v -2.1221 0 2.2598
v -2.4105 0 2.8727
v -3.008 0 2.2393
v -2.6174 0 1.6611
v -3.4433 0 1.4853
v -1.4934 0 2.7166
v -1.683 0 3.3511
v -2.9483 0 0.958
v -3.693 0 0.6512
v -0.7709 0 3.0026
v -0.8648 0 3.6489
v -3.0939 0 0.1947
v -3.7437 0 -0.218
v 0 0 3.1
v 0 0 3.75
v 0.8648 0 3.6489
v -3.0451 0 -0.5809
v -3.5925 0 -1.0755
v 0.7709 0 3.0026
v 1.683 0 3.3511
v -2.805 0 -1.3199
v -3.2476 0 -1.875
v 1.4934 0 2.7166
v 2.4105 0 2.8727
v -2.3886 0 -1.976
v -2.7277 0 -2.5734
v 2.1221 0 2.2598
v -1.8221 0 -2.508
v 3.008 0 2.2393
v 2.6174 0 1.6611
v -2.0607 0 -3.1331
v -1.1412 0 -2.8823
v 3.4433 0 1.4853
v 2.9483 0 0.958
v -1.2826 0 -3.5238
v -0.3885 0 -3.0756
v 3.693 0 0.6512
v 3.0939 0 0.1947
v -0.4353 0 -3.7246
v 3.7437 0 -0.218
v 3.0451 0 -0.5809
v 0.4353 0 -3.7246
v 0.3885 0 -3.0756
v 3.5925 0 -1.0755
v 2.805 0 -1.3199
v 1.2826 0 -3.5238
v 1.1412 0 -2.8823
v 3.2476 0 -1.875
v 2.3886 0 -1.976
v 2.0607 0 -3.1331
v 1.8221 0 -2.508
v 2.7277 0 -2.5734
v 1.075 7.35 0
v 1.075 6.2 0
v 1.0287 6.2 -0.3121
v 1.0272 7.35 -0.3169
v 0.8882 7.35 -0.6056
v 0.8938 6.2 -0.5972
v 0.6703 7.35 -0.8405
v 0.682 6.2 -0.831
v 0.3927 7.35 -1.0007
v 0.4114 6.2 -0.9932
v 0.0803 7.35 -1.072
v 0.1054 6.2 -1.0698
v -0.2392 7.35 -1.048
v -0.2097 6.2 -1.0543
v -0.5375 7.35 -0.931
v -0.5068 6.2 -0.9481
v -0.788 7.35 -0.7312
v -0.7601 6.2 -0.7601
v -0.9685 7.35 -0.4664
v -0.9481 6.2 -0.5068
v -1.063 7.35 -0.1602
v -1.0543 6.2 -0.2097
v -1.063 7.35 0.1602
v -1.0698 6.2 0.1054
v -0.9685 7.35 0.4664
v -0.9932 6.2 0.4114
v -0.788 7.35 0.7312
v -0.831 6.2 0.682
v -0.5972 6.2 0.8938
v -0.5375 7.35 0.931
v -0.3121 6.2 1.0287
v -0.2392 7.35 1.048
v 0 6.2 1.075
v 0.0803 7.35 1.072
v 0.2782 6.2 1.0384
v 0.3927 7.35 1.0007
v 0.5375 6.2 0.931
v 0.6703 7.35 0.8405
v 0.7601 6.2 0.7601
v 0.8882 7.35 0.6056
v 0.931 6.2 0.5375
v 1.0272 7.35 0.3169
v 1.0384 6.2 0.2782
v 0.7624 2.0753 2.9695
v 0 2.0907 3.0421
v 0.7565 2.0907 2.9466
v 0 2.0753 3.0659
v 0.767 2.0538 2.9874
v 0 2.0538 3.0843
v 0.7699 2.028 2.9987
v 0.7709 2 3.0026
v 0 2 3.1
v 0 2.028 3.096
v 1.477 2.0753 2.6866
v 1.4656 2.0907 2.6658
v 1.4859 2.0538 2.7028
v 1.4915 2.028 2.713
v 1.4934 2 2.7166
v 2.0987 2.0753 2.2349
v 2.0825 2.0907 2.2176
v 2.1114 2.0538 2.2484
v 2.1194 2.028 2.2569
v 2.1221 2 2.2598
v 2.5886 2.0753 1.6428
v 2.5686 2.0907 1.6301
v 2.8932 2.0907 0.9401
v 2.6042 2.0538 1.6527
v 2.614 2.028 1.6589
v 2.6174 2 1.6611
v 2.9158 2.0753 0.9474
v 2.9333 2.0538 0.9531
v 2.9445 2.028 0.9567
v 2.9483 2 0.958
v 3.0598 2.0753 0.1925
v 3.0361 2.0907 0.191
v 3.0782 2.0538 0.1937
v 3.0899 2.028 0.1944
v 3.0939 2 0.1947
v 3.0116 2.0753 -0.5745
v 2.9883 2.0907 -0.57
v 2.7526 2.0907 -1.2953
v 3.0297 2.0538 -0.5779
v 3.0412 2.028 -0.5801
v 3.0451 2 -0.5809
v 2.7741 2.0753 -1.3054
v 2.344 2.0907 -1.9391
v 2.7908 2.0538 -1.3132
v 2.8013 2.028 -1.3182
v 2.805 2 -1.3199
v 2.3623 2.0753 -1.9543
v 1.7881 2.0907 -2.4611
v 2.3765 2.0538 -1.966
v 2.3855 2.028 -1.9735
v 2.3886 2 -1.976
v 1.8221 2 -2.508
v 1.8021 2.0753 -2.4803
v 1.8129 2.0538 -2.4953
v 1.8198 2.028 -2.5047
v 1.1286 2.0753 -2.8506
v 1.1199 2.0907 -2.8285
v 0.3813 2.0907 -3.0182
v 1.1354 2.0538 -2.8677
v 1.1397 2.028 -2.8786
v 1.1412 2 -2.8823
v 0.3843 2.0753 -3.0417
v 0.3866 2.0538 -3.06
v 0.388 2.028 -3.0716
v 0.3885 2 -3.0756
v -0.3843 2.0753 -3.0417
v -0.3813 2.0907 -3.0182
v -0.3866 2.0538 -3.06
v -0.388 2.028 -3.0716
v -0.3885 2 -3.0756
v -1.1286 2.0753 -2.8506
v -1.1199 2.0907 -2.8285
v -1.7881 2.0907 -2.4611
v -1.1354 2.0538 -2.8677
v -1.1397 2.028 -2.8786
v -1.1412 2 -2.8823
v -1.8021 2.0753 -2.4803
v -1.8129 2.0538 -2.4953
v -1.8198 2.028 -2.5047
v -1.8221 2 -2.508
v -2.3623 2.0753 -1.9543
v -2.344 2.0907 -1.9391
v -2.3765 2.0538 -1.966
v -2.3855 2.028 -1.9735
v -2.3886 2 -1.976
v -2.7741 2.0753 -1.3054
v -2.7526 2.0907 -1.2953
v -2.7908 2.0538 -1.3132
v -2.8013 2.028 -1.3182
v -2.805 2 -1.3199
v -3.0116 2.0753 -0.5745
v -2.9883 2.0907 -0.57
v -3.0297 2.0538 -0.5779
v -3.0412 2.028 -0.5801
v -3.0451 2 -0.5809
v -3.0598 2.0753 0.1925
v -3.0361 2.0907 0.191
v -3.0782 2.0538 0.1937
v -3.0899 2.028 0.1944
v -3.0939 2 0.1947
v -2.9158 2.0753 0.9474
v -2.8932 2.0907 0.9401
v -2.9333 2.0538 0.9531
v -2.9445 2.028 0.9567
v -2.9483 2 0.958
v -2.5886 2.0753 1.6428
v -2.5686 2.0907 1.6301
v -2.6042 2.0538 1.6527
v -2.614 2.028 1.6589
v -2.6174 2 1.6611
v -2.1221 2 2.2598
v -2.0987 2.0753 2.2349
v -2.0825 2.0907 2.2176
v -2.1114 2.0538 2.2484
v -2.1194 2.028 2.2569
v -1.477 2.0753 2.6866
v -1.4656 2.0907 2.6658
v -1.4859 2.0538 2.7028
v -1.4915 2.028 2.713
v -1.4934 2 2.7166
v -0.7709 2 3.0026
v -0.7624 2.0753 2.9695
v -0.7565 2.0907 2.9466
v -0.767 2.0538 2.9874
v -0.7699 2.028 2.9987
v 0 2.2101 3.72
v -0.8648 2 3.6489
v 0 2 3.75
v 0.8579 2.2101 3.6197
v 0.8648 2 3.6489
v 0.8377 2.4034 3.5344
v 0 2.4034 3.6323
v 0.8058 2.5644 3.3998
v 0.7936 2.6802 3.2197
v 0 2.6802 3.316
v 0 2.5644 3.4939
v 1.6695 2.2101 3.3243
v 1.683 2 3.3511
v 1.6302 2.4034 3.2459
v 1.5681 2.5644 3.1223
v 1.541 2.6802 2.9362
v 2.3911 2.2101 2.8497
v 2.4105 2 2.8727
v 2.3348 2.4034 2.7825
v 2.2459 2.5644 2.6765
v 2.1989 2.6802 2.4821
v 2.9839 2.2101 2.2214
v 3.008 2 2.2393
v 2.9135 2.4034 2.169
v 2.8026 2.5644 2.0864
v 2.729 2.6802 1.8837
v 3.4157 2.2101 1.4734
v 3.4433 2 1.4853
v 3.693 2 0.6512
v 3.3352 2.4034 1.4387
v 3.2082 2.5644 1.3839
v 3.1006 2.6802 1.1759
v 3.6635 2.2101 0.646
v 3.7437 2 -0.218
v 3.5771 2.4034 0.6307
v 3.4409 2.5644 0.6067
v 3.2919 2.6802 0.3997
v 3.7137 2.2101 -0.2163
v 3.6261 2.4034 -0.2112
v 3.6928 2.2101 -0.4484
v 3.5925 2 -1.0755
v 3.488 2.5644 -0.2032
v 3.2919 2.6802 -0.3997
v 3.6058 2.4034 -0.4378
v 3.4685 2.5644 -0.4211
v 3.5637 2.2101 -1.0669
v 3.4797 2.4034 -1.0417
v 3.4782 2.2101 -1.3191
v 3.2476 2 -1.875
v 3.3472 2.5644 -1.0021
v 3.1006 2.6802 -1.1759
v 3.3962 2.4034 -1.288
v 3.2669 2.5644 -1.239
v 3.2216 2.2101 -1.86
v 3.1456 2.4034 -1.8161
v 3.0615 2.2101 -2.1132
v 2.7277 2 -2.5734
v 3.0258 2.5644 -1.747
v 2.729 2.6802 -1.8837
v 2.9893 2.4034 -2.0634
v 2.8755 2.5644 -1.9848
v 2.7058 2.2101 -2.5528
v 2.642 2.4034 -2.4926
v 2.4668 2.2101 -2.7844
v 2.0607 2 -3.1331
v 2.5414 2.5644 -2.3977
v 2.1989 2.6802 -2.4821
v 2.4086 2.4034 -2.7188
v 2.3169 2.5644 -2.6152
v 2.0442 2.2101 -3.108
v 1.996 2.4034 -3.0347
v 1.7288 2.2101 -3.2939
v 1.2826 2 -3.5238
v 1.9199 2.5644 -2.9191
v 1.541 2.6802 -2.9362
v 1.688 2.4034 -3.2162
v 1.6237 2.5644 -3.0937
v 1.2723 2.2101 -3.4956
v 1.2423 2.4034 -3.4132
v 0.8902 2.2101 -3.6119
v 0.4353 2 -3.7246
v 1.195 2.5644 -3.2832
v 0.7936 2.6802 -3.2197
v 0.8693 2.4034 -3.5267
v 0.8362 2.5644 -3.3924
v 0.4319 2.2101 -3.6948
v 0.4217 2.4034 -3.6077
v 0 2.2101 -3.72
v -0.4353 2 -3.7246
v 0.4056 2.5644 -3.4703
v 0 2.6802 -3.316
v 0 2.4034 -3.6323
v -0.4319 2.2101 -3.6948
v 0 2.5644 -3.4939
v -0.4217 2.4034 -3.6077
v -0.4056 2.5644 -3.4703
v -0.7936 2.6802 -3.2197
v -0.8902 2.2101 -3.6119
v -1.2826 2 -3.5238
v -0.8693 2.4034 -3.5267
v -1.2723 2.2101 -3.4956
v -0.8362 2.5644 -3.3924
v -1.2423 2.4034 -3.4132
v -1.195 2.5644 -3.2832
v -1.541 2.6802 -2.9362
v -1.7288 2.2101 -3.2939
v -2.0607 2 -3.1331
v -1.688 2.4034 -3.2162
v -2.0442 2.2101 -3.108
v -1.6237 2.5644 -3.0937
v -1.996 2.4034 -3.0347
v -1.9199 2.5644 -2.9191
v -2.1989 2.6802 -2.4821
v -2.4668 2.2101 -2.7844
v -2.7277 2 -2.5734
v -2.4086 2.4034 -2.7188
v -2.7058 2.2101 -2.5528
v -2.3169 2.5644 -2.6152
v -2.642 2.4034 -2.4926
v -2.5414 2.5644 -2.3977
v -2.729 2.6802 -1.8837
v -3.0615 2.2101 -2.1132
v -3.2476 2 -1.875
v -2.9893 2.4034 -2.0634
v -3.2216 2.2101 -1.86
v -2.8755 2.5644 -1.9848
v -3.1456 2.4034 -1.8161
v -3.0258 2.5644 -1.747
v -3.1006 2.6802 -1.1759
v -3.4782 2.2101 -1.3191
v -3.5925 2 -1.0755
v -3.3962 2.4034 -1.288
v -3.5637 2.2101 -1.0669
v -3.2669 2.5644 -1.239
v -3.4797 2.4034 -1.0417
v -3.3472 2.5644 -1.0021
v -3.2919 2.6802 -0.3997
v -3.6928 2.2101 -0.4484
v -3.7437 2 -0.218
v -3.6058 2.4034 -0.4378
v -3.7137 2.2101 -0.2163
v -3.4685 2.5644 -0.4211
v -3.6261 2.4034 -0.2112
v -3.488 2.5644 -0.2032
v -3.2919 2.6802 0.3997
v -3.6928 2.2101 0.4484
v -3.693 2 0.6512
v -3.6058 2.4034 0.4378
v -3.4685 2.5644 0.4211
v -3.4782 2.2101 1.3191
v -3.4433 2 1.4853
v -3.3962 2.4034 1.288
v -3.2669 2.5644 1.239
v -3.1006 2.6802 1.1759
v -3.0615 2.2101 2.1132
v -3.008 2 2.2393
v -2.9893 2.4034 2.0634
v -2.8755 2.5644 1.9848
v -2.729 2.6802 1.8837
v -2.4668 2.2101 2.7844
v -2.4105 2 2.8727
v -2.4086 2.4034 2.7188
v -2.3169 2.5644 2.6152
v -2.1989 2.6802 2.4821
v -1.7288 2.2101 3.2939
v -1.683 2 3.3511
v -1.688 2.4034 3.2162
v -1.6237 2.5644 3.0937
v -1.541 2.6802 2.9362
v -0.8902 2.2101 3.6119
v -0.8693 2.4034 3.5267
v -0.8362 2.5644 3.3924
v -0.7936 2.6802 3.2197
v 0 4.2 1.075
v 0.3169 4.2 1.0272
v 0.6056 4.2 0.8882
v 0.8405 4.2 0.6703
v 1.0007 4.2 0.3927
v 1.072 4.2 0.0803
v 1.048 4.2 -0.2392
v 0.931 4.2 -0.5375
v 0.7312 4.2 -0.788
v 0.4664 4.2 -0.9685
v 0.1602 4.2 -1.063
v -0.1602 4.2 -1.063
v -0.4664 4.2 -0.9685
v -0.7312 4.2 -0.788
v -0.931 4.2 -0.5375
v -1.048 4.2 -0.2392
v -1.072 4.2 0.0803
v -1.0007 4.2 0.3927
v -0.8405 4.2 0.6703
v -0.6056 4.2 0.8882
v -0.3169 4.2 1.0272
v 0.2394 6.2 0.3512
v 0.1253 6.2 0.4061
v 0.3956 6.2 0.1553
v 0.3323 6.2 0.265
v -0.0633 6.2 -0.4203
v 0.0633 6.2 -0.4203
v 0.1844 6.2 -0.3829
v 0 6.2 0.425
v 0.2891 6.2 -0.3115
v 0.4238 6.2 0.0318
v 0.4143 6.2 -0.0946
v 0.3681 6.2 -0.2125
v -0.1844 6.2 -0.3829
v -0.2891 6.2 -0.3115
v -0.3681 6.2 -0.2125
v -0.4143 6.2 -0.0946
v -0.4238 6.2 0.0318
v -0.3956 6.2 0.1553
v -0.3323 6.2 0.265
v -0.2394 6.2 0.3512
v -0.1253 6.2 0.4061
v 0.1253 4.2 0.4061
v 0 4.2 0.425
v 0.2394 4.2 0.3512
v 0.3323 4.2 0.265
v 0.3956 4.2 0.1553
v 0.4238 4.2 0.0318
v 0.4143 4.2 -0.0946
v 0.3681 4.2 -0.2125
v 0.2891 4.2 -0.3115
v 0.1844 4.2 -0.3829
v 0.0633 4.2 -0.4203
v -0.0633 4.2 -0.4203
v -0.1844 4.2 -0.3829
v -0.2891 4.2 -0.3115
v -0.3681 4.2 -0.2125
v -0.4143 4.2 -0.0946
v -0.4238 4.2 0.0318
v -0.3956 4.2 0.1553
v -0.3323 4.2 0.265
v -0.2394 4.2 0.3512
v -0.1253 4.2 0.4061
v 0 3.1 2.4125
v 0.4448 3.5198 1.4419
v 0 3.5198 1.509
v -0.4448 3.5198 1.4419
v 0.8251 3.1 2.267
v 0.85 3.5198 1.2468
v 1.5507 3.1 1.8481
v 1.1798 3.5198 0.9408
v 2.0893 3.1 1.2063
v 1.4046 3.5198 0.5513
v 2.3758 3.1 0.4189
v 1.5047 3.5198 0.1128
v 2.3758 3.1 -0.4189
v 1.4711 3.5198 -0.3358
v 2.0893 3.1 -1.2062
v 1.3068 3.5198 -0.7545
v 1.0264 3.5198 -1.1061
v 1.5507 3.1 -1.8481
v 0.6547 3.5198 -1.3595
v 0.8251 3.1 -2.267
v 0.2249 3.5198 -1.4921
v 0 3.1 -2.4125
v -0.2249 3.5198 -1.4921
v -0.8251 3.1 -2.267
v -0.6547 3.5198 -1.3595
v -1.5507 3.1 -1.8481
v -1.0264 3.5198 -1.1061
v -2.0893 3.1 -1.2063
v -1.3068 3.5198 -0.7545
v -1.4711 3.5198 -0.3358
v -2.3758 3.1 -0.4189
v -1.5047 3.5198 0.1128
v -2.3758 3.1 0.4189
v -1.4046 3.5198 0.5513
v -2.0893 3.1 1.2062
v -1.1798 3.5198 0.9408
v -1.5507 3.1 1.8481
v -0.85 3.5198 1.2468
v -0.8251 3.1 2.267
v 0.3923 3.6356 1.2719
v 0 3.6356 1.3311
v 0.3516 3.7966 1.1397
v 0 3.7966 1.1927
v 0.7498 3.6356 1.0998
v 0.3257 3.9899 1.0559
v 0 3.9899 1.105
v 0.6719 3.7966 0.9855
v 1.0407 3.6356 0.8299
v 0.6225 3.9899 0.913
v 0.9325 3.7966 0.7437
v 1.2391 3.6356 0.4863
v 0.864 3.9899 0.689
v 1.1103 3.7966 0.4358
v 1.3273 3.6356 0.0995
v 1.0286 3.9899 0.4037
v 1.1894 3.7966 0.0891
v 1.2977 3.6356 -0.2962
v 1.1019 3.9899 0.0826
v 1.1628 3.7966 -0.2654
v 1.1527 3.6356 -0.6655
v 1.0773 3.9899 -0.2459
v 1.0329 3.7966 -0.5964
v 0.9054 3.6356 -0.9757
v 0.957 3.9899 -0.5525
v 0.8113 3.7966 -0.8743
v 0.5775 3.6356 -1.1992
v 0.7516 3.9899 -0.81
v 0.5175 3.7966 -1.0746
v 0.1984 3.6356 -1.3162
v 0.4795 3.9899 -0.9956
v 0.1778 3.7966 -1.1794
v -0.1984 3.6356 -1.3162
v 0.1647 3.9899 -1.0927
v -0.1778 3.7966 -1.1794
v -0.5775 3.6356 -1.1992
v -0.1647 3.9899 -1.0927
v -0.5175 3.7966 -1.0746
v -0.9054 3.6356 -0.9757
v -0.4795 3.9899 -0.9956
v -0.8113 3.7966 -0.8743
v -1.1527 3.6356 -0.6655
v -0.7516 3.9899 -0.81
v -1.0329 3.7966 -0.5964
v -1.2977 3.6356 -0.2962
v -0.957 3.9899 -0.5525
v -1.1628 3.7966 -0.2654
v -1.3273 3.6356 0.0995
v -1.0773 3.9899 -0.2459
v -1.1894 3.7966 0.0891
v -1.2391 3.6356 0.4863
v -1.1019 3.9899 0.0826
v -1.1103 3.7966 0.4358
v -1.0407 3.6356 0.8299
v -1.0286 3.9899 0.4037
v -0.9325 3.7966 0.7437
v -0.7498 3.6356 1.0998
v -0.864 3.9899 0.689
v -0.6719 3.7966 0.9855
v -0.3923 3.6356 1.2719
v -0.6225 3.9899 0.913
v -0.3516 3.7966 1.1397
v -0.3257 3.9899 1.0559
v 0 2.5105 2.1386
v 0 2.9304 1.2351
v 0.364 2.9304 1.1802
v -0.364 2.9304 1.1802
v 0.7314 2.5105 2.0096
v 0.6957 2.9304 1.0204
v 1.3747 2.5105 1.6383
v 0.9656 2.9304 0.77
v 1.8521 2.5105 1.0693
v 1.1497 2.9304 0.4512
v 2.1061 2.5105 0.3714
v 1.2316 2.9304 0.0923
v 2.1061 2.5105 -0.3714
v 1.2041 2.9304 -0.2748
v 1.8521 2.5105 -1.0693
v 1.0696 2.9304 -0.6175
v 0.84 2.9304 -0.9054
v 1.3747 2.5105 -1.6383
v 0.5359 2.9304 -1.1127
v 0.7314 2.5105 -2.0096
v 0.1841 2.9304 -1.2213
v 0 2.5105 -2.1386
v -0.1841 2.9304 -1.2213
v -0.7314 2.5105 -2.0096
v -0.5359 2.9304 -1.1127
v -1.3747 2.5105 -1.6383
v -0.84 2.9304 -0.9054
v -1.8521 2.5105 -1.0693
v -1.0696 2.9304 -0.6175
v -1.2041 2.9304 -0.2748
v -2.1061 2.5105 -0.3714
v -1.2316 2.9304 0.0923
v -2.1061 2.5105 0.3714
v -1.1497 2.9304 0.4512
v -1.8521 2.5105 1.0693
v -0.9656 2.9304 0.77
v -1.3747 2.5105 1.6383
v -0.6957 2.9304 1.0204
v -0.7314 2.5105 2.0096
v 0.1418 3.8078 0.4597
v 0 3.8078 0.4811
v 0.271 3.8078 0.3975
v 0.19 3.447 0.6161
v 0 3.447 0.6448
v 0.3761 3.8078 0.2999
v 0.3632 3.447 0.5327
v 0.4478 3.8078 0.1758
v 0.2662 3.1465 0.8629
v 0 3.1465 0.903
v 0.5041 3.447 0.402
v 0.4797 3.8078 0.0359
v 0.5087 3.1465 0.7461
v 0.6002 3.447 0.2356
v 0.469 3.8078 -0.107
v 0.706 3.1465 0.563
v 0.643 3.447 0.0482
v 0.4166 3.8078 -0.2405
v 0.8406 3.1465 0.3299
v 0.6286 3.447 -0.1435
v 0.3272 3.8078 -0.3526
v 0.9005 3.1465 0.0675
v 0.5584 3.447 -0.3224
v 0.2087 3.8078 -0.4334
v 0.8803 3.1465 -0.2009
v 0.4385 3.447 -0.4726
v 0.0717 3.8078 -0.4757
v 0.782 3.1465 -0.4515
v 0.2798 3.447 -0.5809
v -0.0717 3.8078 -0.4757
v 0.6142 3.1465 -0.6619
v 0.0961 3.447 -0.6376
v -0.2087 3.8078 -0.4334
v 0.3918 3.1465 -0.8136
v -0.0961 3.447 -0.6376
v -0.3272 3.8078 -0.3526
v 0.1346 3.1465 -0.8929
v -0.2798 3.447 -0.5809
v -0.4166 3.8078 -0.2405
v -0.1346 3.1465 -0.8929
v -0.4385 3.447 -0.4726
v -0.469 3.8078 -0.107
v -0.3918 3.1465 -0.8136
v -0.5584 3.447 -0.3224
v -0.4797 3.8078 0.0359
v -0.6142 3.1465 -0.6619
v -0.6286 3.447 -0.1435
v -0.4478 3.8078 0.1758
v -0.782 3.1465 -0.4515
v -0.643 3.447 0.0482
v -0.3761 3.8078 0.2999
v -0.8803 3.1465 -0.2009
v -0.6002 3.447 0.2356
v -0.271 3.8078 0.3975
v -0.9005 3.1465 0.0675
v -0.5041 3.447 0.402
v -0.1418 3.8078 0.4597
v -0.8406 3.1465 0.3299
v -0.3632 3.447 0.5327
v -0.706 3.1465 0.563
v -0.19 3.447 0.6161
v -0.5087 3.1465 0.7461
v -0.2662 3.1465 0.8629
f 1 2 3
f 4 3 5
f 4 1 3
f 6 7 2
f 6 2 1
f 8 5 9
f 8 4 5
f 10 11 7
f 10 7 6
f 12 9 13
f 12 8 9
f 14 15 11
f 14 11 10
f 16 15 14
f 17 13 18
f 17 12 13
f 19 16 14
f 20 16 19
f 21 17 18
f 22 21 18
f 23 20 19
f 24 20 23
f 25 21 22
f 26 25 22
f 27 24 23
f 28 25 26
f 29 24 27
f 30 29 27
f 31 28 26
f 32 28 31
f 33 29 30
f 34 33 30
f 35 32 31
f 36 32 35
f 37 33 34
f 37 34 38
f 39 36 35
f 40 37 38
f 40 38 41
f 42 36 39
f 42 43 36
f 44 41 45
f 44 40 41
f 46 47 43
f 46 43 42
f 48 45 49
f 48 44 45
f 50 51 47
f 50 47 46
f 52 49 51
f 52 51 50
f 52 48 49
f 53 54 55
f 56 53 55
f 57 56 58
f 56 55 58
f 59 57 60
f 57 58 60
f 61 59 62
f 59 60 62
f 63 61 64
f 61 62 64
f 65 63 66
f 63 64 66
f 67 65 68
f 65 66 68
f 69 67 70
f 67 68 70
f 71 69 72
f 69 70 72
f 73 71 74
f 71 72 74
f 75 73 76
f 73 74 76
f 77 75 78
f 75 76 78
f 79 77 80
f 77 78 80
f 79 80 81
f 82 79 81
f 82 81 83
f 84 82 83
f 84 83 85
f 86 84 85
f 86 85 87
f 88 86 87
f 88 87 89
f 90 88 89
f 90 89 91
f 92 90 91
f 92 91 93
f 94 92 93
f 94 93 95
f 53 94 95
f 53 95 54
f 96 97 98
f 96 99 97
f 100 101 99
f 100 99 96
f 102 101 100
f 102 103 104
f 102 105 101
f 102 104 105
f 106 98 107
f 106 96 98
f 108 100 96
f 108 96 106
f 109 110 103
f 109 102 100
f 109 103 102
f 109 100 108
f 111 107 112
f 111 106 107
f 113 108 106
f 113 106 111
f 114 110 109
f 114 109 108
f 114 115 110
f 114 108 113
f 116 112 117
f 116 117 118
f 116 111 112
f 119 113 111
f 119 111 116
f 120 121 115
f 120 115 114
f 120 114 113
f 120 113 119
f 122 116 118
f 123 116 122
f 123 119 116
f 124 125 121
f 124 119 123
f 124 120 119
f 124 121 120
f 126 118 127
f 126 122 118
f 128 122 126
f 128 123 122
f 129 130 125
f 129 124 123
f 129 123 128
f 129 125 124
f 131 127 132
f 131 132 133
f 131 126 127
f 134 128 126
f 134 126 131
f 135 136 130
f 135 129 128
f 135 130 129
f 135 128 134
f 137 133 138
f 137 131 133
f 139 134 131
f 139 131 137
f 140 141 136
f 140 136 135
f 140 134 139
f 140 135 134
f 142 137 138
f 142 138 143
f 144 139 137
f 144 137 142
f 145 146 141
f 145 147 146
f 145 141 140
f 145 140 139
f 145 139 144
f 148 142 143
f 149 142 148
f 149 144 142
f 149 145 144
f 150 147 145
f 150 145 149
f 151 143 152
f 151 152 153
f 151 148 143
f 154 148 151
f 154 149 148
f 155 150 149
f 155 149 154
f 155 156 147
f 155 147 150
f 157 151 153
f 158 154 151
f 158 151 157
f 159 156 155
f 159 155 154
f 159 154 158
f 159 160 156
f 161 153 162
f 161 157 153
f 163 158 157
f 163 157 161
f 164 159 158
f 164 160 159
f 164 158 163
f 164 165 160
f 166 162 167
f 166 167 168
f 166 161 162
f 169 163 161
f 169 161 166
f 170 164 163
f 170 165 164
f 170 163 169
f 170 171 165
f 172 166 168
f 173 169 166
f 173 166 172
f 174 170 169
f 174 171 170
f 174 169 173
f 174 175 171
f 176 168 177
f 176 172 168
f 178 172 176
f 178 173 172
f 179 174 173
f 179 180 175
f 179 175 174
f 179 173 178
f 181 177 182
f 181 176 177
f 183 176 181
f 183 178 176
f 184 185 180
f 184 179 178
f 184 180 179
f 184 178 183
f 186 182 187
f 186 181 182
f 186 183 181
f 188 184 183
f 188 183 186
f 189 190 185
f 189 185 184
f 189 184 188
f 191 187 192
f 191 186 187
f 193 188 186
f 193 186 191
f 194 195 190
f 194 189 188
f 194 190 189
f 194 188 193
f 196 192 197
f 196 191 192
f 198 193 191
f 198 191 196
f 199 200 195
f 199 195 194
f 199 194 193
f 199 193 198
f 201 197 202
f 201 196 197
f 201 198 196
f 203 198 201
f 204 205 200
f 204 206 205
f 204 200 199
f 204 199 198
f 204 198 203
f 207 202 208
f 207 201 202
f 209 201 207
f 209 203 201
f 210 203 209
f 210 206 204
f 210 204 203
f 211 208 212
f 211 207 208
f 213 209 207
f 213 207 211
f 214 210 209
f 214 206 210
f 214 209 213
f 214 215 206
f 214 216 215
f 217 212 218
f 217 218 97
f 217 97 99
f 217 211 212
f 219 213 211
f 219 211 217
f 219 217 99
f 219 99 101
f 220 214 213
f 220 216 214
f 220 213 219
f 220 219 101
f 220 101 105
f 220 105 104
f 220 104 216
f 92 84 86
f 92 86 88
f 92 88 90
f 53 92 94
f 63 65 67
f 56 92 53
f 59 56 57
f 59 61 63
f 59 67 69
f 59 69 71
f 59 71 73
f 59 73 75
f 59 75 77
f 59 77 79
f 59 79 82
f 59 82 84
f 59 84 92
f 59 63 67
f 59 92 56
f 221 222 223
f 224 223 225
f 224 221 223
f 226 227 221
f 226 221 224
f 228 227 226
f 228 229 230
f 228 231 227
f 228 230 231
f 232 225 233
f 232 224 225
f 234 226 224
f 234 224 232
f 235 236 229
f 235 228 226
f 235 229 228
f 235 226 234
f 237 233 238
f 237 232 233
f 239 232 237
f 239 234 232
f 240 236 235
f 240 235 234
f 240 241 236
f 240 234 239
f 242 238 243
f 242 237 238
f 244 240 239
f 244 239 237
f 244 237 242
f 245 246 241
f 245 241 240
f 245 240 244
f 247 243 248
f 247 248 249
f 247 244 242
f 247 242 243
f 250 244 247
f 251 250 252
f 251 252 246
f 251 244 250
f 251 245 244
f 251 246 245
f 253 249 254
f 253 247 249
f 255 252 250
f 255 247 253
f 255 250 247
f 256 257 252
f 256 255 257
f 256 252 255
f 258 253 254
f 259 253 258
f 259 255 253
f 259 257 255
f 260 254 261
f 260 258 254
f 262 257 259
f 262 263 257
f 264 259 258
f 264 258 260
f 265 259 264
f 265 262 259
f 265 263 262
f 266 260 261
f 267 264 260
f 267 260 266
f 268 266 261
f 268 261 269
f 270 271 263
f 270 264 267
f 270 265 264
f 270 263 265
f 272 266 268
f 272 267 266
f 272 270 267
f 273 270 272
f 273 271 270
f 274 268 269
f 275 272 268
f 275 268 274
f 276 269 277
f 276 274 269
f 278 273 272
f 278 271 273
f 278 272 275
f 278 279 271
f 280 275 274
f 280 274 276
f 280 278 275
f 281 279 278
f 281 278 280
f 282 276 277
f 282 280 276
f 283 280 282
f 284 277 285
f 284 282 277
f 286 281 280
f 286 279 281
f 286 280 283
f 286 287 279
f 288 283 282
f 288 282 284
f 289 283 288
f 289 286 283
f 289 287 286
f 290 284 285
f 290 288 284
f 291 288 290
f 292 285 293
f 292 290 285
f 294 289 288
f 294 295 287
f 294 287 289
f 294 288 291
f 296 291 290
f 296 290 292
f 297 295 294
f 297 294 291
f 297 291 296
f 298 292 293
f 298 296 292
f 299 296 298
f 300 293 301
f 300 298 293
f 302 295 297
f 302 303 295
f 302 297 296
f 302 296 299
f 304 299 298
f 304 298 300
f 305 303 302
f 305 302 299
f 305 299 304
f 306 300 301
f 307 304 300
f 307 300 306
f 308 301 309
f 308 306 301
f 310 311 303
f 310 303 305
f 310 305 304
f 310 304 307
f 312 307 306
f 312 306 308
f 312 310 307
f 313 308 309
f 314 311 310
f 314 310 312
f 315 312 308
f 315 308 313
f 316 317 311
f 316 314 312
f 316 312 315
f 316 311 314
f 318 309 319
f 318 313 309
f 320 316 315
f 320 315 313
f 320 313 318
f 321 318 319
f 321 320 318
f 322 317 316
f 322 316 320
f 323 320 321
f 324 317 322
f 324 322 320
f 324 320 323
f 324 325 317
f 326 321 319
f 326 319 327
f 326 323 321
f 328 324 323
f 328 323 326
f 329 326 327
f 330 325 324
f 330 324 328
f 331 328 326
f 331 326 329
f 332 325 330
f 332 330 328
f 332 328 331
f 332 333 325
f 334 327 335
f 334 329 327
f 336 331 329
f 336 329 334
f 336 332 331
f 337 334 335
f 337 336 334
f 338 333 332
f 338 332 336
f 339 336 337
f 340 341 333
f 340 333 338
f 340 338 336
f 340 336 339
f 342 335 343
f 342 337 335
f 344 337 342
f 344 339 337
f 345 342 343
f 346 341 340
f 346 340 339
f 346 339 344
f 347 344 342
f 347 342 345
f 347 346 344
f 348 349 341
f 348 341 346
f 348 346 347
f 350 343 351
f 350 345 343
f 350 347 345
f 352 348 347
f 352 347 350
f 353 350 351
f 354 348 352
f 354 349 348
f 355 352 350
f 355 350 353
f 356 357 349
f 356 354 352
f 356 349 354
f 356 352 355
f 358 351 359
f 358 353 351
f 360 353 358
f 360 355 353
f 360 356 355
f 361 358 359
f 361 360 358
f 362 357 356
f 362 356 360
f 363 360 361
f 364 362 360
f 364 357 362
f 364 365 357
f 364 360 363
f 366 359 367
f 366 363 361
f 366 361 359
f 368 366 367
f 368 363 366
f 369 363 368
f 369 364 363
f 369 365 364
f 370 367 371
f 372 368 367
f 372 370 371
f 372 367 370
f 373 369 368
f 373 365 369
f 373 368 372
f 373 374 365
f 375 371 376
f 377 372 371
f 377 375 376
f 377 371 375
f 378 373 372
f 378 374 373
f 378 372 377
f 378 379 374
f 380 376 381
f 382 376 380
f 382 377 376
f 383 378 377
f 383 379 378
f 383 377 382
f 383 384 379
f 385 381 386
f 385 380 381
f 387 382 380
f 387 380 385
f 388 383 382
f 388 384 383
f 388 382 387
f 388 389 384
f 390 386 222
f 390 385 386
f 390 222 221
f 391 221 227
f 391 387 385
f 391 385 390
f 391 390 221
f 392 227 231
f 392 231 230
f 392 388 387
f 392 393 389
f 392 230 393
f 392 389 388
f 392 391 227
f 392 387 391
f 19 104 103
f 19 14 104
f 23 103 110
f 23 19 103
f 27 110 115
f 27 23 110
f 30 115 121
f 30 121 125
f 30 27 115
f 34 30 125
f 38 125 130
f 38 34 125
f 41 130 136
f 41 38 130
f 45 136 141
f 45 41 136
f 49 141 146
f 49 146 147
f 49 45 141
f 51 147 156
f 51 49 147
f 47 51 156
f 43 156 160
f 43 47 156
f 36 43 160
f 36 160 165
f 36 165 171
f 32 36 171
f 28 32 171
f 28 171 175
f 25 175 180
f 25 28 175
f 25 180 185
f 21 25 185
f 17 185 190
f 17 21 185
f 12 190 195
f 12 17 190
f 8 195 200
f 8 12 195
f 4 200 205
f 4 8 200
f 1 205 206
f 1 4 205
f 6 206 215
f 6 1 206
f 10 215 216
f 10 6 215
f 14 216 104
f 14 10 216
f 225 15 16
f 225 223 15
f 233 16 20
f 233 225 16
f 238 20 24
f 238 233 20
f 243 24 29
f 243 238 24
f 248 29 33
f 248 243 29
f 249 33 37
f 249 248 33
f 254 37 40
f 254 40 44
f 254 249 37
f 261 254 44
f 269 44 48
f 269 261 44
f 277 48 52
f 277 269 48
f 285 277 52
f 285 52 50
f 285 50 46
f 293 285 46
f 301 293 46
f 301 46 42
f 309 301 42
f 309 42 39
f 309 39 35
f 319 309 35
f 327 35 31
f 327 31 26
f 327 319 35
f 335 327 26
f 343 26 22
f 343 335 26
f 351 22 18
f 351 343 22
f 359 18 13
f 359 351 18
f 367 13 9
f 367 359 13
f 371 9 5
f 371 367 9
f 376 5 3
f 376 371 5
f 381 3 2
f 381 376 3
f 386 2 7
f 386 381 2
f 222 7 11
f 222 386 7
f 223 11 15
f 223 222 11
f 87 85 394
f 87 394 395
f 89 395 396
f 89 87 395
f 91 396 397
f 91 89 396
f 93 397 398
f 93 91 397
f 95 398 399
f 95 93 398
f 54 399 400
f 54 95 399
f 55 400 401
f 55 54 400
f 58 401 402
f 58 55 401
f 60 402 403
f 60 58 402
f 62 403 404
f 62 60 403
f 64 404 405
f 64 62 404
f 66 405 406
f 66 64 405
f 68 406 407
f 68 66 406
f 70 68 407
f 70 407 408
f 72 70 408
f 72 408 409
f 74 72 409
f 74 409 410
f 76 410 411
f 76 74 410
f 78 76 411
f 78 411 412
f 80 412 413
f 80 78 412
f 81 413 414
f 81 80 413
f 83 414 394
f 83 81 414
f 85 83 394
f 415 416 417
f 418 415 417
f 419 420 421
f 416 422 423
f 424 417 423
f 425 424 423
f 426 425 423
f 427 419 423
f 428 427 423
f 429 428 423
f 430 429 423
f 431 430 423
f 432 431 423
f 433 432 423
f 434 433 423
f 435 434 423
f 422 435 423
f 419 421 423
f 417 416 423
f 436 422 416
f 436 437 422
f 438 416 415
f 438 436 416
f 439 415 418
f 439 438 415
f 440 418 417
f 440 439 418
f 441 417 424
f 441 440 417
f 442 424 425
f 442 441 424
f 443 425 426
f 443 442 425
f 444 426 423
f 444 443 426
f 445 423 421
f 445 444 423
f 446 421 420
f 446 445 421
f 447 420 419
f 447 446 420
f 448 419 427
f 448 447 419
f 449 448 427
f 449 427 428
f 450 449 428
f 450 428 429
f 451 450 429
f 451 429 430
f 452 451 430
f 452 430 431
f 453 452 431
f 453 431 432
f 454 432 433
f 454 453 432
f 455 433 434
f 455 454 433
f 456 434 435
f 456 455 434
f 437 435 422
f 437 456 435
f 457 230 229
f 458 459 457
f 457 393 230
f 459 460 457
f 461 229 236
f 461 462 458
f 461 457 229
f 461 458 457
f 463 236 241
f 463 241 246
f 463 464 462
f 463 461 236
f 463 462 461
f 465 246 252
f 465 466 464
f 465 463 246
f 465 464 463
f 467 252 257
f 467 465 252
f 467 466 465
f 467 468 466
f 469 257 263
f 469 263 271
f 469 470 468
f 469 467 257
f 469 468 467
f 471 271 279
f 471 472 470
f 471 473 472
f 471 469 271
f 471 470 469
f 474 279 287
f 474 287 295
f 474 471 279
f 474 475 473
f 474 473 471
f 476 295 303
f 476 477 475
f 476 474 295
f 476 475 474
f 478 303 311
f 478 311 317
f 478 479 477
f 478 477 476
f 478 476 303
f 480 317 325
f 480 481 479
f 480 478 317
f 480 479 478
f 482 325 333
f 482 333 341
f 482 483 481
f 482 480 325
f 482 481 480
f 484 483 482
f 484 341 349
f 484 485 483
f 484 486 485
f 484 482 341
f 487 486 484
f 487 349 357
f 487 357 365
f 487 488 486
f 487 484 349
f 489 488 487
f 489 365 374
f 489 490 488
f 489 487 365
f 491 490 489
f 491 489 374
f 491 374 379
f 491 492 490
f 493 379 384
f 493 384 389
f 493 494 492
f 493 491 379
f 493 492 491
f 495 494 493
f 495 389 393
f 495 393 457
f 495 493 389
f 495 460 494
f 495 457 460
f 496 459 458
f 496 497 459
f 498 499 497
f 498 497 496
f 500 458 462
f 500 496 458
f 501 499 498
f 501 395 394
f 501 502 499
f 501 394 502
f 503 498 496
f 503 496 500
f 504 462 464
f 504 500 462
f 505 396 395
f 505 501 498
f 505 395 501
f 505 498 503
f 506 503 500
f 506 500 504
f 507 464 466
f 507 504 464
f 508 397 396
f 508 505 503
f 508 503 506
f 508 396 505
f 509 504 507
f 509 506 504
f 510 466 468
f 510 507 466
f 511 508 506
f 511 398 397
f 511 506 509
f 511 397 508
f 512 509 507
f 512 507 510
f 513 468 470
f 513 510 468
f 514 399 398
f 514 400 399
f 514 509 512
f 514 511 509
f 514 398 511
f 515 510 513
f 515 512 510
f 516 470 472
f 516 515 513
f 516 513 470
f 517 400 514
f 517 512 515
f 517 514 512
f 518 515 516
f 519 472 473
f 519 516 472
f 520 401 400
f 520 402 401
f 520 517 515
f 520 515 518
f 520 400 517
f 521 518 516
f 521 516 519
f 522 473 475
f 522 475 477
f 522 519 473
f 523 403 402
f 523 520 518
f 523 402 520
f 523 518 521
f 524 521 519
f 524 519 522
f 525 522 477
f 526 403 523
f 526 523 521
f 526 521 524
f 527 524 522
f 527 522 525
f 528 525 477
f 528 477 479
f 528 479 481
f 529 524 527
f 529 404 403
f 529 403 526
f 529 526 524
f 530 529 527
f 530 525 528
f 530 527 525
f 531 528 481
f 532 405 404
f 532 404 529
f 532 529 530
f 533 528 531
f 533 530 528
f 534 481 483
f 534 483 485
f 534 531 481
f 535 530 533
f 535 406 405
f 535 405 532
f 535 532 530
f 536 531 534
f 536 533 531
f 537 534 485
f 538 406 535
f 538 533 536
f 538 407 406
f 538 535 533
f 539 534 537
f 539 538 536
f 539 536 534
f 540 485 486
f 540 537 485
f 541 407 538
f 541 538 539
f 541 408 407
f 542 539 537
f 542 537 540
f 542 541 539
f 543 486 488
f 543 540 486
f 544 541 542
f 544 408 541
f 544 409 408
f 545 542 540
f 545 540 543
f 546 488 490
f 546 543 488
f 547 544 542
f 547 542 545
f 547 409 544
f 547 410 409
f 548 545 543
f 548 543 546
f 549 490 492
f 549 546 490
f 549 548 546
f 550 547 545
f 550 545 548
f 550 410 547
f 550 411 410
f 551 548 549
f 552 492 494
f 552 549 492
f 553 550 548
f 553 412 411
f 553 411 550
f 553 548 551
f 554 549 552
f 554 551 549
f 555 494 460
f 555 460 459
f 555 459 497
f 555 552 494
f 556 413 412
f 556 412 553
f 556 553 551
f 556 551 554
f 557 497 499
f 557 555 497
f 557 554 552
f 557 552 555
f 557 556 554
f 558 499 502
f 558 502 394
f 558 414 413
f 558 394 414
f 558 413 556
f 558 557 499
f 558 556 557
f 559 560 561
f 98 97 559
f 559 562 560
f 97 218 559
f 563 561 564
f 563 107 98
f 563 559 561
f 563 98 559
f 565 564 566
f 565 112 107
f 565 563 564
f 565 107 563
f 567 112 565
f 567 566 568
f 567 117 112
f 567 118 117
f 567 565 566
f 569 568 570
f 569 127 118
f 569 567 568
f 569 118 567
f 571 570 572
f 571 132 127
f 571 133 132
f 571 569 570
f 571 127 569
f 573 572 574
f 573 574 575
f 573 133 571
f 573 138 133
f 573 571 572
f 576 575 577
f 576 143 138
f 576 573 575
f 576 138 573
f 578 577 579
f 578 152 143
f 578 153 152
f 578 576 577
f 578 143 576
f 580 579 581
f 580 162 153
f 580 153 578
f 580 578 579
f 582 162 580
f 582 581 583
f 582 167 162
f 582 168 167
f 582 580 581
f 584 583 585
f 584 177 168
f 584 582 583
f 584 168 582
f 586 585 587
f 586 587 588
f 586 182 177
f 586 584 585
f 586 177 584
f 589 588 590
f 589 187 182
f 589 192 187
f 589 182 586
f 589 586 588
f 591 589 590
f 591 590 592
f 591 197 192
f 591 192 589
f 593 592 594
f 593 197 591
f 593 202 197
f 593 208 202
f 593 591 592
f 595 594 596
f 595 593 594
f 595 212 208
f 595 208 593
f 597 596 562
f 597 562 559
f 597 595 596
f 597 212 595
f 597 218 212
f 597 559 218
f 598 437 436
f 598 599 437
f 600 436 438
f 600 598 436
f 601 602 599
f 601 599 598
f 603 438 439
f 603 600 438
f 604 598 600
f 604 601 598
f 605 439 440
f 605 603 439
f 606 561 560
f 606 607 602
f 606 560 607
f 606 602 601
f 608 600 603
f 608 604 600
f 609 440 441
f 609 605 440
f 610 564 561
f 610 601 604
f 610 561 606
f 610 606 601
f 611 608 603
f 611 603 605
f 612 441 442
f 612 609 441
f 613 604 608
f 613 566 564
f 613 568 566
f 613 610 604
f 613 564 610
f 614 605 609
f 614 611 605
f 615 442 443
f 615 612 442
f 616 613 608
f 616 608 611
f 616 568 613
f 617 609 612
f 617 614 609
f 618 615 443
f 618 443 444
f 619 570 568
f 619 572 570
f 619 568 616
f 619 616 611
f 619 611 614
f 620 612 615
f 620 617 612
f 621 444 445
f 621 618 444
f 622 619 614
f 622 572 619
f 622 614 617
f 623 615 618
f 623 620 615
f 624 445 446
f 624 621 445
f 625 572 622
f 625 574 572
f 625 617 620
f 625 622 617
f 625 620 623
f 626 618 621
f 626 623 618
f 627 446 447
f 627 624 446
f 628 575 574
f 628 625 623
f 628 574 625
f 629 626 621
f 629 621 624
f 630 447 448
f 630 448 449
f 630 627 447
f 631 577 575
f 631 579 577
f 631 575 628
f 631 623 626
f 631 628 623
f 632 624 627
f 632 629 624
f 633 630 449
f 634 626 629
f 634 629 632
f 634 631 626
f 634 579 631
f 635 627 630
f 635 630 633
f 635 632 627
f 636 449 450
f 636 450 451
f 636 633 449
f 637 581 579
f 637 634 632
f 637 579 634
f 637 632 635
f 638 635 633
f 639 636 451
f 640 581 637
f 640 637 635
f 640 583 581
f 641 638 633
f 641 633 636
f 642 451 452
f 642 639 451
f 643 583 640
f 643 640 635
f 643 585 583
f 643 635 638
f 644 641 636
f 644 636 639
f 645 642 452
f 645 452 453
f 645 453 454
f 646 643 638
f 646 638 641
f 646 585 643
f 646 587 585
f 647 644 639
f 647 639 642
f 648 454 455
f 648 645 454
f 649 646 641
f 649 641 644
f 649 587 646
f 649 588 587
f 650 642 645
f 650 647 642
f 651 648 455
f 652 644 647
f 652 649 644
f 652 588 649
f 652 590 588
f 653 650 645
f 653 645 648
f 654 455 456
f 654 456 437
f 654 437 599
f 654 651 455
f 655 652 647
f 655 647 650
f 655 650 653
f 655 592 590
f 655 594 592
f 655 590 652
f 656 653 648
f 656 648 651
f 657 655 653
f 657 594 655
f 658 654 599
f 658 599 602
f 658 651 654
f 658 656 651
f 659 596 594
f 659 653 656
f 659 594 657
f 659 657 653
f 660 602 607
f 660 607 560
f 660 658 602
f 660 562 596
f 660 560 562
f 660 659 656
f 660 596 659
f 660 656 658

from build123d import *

# Parameters (mm, degrees)
SKETCH8_R           = 1.075
BOSS_EXTRUDE1_DEPTH = 1.15


with BuildPart() as part:
    # Sketch6 → Revolve-Thin2 (revolve)
    with BuildSketch(Plane(origin=(0, 0, 0), x_dir=(0, 0, -1), z_dir=(1, 0, 0))):
        with BuildLine():
            Line((-3.75, 0), (-3.75, 2))
            ThreePointArc((-3.75, 2), (-3.632270634, 2.403402832), (-3.31604308, 2.680159372))
            Line((-3.31604308, 2.680159372), (-1.50895692, 3.519840628))
            ThreePointArc((-1.50895692, 3.519840628), (-1.192729366, 3.796597168), (-1.075, 4.2))
            Line((-1.075, 4.2), (-1.075, 6.2))
            Line((-1.075, 6.2), (-0.425, 6.2))
            Line((-0.425, 6.2), (-0.425, 4.2))
            ThreePointArc((-0.425, 4.2), (-0.644761483, 3.44698138), (-1.235052917, 2.930369172))
            Line((-1.235052917, 2.930369172), (-3.042139077, 2.090687916))
            ThreePointArc((-3.042139077, 2.090687916), (-3.084302751, 2.053787044), (-3.1, 2))
            Line((-3.1, 2), (-3.1, 0))
            Line((-3.1, 0), (-3.75, 0))
        make_face()
    revolve(axis=Axis((0, -0.227579974, 0), (0, 1, 0)))

    # Sketch8 → Boss-Extrude1 (add)
    with BuildSketch(Plane(origin=(0, 6.2, 0), x_dir=(1, 0, 0), z_dir=(0, 1, 0))):
        Circle(SKETCH8_R)
    extrude(amount=BOSS_EXTRUDE1_DEPTH)


solid = part.part
